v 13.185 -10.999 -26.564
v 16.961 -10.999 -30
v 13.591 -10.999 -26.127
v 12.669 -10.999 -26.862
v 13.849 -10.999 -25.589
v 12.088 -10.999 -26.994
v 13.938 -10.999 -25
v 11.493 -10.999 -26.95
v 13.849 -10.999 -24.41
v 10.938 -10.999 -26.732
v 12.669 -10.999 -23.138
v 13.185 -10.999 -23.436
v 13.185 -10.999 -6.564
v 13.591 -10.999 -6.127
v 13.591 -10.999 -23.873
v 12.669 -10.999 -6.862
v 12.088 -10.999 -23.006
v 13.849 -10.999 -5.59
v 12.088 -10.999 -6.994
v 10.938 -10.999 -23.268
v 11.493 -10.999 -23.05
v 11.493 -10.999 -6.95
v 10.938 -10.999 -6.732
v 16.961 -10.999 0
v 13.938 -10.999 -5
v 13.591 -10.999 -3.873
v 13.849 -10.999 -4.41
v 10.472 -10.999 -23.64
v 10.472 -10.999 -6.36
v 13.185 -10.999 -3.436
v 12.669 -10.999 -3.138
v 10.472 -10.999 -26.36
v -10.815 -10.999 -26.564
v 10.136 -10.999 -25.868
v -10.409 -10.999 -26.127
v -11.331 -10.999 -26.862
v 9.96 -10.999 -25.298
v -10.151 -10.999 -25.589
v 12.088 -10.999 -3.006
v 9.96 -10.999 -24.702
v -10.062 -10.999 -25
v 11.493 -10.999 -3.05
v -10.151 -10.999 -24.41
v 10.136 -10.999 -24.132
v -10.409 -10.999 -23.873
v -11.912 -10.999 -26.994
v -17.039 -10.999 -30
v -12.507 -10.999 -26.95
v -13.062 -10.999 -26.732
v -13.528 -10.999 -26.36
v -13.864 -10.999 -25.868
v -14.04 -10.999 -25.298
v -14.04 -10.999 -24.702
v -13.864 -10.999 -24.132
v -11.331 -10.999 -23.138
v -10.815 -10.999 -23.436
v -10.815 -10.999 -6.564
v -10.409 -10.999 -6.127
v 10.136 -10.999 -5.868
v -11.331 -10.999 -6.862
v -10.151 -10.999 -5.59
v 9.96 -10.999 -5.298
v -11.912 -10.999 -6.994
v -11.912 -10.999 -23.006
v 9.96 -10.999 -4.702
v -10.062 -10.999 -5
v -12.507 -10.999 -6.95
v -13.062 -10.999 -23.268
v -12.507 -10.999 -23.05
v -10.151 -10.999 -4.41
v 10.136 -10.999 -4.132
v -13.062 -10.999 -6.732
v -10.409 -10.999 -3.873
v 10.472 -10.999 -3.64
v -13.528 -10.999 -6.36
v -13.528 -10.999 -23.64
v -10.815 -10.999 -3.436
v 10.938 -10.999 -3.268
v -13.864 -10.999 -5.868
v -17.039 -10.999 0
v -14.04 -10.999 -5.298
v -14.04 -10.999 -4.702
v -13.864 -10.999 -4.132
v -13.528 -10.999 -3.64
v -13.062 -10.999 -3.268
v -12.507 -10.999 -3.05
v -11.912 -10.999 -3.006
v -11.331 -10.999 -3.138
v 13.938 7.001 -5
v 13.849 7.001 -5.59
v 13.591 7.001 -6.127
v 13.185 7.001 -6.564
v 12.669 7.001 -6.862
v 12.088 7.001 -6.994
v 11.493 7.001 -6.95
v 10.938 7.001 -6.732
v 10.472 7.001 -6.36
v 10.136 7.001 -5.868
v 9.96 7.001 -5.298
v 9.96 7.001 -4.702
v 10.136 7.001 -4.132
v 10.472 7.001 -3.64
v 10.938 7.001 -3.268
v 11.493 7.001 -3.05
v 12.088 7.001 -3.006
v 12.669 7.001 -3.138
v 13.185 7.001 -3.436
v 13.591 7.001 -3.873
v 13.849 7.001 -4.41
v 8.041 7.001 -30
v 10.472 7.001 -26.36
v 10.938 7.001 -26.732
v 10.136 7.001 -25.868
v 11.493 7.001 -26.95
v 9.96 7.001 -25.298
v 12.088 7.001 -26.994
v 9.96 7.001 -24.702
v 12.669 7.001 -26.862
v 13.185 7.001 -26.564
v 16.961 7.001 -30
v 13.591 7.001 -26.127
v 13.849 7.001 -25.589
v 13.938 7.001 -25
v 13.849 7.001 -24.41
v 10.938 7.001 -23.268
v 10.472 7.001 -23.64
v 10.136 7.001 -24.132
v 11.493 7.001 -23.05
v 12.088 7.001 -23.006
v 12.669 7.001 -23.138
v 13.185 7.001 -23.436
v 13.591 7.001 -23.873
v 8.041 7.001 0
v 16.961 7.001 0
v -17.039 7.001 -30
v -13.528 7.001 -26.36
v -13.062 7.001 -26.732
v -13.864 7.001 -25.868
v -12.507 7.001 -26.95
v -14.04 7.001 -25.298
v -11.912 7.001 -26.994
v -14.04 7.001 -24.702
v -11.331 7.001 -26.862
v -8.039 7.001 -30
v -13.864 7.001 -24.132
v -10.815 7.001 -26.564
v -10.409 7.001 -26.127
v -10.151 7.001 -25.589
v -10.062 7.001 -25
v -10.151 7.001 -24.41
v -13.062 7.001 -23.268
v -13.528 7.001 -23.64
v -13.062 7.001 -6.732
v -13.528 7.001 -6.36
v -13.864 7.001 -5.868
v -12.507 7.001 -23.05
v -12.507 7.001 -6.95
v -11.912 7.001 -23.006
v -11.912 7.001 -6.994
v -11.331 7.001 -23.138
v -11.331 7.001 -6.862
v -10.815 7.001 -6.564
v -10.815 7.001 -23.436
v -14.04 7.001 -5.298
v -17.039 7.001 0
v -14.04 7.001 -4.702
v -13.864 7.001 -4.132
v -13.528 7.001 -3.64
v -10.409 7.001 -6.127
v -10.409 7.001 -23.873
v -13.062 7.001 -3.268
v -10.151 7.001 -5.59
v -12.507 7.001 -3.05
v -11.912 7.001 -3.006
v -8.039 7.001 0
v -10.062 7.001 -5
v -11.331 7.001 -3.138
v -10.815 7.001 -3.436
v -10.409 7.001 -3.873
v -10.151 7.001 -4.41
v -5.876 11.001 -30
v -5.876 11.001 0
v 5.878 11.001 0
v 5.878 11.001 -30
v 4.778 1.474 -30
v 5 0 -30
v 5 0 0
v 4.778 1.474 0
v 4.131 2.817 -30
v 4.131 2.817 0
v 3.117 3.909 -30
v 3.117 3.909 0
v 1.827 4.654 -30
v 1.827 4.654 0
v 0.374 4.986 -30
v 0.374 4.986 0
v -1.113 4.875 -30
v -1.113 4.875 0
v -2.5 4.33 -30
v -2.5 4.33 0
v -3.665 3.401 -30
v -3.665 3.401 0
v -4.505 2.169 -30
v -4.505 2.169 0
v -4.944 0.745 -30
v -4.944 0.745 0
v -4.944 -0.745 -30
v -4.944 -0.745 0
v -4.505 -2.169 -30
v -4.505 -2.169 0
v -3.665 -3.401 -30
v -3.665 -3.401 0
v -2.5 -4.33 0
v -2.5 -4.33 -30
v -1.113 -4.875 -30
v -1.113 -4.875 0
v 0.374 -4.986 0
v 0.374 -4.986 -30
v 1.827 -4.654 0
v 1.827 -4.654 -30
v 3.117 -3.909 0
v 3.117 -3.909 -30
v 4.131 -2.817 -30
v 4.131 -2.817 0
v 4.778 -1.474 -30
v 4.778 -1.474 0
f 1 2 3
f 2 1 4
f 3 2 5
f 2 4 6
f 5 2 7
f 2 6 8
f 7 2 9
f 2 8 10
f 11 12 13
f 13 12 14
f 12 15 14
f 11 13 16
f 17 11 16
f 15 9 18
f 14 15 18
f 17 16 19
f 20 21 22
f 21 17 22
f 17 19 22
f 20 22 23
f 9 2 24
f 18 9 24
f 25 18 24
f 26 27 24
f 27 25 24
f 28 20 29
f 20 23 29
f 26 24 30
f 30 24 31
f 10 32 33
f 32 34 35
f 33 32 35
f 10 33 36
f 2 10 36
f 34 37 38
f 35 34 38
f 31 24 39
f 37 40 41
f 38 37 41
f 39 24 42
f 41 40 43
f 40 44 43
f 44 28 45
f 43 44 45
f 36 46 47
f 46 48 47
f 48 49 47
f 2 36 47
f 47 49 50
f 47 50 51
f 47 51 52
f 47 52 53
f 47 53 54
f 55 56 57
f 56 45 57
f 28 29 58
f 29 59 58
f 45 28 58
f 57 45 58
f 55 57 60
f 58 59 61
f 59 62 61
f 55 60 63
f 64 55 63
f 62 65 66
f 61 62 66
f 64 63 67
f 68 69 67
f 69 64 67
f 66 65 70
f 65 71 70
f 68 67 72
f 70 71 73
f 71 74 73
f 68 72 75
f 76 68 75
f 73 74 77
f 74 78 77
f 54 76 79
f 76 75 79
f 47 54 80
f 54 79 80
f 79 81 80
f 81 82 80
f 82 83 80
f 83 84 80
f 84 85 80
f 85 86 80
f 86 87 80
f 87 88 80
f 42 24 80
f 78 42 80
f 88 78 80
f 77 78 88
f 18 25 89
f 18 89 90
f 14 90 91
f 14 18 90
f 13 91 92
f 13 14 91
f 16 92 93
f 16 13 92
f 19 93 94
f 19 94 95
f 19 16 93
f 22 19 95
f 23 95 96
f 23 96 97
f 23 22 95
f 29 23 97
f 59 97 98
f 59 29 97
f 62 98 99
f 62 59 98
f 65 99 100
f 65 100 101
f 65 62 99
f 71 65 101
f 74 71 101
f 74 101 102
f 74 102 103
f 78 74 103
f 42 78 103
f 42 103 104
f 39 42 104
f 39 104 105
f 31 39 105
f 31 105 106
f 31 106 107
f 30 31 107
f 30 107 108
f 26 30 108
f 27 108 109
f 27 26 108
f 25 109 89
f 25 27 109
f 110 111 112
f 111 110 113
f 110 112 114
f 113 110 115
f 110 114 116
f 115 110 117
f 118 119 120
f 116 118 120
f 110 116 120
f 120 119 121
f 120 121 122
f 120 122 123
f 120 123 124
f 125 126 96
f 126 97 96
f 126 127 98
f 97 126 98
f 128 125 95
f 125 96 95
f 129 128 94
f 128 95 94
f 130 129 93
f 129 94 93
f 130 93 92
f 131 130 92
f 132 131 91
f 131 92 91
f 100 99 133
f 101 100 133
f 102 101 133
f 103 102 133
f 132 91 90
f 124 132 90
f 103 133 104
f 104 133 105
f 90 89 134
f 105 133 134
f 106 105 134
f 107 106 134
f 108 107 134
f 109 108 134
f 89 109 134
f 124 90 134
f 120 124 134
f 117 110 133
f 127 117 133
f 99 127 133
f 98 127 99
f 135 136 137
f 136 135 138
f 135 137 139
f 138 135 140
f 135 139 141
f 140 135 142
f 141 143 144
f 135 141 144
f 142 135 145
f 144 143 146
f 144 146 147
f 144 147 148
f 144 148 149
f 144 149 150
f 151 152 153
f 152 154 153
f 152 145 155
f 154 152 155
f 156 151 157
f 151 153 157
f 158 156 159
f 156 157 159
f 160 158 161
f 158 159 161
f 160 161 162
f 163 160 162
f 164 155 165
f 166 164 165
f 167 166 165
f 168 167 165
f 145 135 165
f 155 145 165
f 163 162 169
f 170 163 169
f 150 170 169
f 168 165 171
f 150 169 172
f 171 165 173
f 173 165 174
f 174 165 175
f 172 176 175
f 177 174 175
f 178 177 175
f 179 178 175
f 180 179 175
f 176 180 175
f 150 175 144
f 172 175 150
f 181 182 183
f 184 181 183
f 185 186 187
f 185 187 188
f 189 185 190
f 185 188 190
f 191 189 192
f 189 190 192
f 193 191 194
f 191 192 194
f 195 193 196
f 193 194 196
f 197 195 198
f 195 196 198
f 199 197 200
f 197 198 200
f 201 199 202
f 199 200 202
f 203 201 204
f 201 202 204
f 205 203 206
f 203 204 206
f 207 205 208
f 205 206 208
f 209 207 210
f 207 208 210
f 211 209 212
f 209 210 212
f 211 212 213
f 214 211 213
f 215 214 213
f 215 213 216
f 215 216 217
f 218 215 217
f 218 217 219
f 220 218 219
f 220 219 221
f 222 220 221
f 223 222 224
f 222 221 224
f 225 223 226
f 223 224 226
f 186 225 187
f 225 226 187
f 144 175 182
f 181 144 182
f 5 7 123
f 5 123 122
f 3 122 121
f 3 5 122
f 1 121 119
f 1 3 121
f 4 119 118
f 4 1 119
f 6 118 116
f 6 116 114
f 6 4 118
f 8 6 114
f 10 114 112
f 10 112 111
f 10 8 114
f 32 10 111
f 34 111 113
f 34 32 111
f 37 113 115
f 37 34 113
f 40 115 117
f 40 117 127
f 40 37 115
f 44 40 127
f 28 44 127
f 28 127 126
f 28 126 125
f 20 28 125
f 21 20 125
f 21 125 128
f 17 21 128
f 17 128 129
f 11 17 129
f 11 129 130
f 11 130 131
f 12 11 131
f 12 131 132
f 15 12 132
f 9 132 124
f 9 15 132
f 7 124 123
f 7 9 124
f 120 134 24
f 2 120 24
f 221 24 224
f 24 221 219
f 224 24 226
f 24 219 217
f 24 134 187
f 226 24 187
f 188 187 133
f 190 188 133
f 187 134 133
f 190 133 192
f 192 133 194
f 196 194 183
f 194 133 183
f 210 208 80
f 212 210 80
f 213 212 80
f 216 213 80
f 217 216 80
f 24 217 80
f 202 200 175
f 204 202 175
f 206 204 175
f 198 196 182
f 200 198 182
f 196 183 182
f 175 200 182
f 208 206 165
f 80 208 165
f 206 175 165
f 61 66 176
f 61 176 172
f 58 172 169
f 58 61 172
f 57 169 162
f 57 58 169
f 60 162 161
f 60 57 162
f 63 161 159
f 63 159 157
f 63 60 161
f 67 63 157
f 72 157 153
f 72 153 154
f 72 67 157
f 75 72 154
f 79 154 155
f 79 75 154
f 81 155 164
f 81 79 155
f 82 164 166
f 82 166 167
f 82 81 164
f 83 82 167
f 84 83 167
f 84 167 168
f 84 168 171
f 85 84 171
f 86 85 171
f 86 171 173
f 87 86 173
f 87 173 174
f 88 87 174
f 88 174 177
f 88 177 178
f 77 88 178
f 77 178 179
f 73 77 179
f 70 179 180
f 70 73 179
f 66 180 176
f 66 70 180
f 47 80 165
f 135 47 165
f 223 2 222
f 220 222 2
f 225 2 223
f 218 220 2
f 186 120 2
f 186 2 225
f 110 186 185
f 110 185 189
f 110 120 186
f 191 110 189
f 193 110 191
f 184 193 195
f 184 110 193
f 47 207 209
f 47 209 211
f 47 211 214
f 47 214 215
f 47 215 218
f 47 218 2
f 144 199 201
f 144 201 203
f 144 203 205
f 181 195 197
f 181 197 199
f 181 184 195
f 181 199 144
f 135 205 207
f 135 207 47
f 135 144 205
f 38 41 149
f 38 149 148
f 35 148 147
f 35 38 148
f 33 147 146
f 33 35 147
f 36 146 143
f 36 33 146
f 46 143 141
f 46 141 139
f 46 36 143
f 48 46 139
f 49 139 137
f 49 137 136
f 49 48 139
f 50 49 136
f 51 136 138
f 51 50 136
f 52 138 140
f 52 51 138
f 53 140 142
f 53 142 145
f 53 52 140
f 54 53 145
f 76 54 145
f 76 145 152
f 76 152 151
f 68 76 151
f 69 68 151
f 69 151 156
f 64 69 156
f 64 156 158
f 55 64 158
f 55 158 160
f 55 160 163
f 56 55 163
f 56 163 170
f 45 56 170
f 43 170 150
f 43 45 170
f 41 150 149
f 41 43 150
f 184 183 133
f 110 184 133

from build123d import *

# Parameters (mm, degrees)
BOSS_EXTRUDE2_DEPTH    = 30
HOLE_R                 = 5
CUT_EXTRUDE1_DEPTH     = 30
CUT_EXTRUDE2_START     = -10.999447078
CUT_EXTRUDE2_OUTLINE_R = 2
CUT_EXTRUDE2_DEPTH     = 17.999956595


# Read off the part's stored shape, not the designer's step: Cut-Extrude2
with BuildPart() as part:
    # body → Boss-Extrude2 (new body)
    with BuildSketch(Plane.XY):
        Polygon((-8.038514806, 7.000509517), (-5.875565247, 11.000552922), (5.877594601, 11.000552922), (8.04054416, 7.000509517), (16.961485195, 7.000509517), (16.961485195, -10.999447078), (-17.038514805, -10.999447078), (-17.038514805, 7.000509517), align=None)
    extrude(amount=-BOSS_EXTRUDE2_DEPTH)

    # hole → Cut-Extrude1 (cut)
    with BuildSketch(Plane.XY):
        Circle(HOLE_R)
    extrude(amount=-CUT_EXTRUDE1_DEPTH, mode=Mode.SUBTRACT)

    # Cut-Extrude2 outline → Cut-Extrude2 (cut)
    with BuildSketch(Plane(origin=(0, 0, 0), x_dir=(1, 0, 0), z_dir=(0, 1, 0)).offset(CUT_EXTRUDE2_START)):
        with Locations((-12.061902792, 5)):
            Circle(CUT_EXTRUDE2_OUTLINE_R)
        with Locations((-12.061902792, 24.999986325)):
            Circle(CUT_EXTRUDE2_OUTLINE_R)
        with Locations((11.938097208, 24.999986325)):
            Circle(CUT_EXTRUDE2_OUTLINE_R)
        with Locations((11.938097208, 5)):
            Circle(CUT_EXTRUDE2_OUTLINE_R)
    extrude(amount=CUT_EXTRUDE2_DEPTH, mode=Mode.SUBTRACT)


solid = part.part
